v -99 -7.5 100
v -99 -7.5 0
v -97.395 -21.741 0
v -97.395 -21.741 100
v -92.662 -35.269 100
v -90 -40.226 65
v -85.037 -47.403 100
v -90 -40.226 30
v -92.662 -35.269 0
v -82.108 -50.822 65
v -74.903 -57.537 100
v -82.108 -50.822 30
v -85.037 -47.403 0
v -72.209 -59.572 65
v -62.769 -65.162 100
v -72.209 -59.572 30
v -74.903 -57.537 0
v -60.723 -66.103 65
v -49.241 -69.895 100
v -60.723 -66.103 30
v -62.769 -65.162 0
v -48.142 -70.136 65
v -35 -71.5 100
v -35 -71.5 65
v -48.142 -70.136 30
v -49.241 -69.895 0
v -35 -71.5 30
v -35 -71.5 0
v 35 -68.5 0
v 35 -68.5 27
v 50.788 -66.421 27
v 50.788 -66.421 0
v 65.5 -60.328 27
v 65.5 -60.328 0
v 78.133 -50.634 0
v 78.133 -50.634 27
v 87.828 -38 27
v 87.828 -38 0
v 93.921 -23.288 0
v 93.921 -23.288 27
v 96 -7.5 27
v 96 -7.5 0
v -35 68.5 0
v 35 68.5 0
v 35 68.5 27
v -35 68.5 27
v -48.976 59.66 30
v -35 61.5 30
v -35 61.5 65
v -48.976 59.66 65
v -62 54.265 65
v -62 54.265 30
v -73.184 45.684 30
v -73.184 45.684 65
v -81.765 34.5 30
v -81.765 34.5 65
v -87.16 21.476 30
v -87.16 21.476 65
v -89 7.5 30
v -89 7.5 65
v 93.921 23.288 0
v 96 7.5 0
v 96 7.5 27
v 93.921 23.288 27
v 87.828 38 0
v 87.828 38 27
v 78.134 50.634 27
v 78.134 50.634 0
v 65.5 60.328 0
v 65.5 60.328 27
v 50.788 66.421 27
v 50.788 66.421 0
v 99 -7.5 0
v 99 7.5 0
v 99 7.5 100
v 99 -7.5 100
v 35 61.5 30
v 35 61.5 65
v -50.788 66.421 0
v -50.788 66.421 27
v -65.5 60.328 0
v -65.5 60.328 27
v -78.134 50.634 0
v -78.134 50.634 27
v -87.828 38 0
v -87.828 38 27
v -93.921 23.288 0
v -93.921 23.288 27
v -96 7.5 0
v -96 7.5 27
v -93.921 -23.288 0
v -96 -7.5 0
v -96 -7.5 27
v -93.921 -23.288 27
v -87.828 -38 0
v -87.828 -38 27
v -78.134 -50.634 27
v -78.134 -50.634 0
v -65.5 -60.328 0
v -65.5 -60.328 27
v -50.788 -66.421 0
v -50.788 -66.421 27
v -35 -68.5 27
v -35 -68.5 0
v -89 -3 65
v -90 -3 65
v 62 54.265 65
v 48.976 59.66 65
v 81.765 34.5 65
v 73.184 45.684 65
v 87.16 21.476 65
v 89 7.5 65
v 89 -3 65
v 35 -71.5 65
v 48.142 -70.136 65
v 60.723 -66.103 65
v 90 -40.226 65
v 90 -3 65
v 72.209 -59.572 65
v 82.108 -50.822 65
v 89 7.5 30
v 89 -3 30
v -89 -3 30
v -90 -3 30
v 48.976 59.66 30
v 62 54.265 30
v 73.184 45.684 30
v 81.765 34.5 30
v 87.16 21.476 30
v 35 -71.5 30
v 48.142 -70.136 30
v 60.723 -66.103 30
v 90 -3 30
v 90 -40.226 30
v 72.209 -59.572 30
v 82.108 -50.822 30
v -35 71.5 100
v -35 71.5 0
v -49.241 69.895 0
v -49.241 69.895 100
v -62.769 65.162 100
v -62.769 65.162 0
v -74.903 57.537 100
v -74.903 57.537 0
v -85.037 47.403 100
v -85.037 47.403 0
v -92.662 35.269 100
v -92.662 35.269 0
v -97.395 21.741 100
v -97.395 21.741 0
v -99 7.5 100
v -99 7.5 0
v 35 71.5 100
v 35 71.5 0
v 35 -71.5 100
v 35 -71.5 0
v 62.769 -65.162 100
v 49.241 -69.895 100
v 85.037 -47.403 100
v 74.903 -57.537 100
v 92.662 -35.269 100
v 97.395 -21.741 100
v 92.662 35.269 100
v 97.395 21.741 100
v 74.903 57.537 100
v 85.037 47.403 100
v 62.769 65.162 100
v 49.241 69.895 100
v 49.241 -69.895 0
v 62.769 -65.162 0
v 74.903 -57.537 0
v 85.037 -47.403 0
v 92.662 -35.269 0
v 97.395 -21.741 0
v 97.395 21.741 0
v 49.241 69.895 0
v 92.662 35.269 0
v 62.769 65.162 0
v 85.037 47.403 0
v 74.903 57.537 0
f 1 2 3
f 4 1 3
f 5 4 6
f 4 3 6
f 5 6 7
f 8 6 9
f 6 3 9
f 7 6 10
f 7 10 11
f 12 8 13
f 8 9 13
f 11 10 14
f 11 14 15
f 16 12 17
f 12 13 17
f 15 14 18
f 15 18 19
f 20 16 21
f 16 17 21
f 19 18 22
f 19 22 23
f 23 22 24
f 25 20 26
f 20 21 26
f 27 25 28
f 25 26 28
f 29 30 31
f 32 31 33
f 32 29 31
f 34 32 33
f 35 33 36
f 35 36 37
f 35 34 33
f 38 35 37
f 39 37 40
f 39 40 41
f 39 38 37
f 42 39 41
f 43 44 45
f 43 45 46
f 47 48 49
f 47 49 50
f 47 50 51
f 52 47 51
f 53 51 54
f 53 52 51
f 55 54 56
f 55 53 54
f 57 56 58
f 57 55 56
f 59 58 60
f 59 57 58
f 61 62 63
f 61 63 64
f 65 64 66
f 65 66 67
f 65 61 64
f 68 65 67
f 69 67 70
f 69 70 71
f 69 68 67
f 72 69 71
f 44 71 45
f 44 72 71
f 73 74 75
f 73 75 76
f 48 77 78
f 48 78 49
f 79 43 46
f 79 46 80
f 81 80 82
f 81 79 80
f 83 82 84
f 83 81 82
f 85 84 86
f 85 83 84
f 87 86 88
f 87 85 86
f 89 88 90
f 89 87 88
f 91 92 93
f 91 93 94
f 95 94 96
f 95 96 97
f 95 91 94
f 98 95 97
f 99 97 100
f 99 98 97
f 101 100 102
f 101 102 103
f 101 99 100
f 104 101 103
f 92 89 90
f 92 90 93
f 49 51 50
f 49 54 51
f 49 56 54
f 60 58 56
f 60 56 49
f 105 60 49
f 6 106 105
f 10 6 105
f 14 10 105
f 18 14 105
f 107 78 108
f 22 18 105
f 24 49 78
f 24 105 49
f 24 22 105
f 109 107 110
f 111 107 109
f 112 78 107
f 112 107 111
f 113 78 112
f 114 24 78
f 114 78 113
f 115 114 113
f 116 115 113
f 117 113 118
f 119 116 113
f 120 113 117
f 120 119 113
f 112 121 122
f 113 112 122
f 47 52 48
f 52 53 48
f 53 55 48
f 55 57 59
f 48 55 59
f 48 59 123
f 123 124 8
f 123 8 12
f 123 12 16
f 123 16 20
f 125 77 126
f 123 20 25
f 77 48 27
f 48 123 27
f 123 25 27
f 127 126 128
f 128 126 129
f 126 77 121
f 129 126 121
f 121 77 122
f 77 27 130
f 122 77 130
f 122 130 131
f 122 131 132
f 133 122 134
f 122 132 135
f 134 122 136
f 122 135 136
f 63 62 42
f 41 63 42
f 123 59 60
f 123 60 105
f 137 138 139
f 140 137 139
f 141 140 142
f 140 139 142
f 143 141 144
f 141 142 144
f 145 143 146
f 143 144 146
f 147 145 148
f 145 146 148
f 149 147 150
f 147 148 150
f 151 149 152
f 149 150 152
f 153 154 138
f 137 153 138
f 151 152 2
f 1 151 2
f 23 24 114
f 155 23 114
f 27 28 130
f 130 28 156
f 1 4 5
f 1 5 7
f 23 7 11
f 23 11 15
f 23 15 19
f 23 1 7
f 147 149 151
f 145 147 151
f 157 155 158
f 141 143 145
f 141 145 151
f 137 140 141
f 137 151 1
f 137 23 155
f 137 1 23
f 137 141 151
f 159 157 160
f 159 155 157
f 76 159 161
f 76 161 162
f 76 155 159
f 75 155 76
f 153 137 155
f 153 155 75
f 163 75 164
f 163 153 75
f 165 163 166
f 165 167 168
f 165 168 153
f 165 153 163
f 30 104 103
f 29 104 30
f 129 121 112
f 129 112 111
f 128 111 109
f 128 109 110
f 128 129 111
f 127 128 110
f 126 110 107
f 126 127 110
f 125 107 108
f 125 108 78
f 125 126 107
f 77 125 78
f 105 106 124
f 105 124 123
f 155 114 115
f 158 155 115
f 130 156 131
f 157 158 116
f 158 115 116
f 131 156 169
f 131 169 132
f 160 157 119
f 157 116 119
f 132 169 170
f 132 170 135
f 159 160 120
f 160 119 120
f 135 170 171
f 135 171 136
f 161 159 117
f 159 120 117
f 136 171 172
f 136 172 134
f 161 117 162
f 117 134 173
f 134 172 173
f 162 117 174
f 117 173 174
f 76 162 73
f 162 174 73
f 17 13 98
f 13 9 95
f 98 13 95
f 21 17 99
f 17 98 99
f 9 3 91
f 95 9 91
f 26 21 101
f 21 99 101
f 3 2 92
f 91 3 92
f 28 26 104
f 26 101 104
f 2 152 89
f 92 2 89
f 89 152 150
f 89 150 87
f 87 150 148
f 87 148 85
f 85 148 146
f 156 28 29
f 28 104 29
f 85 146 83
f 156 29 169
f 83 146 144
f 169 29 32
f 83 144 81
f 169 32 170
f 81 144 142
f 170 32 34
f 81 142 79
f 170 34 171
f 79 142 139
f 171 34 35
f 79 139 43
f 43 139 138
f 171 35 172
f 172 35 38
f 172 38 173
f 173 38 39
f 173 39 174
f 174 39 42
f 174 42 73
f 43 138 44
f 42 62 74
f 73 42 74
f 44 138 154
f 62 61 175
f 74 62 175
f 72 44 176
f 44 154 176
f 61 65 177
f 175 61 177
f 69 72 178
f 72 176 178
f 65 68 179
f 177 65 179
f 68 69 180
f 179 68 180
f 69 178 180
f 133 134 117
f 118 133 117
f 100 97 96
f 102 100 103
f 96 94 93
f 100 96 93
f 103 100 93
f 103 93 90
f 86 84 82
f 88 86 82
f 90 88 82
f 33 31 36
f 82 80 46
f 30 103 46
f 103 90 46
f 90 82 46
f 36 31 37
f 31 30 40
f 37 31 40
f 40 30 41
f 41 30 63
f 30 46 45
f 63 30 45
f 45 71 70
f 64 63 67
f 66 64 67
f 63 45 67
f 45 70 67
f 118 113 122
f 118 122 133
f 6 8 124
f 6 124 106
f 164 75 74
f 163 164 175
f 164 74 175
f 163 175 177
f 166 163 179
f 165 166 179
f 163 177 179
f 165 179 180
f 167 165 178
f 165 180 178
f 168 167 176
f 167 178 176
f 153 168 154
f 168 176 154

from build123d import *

# Parameters (mm, degrees)
PAD_DEPTH       = 100
POCKET_DEPTH    = 35
SKETCH002_W     = 180
SKETCH002_H     = 35
POCKET001_DEPTH = 77
POCKET002_DEPTH = 27


with BuildPart() as part:
    # Sketch001 → Pad (new body)
    with BuildSketch(Plane.XY):
        with BuildLine():
            ThreePointArc((99, 7.5), (80.254858, 52.75481), (35.000067, 71.5))
            Line((35.000067, 71.5), (-35, 71.5))
            ThreePointArc((-35, 71.5), (-80.254834, 52.754834), (-99, 7.5))
            Line((-99, 7.5), (-99, -7.5))
            ThreePointArc((-99, -7.5), (-80.254834, -52.754834), (-35, -71.5))
            Line((-35, -71.5), (35.000001, -71.5))
            ThreePointArc((35.000001, -71.5), (80.254834, -52.754834), (99, -7.5))
            Line((99, 7.5), (99, -7.5))
        make_face()
    extrude(amount=PAD_DEPTH)

    # Sketch → Pocket (cut)
    with BuildSketch(Plane.XY.offset(30)):
        with BuildLine():
            ThreePointArc((89, 7.5), (73.183766, 45.683767), (34.999999, 61.5))
            Line((34.999999, 61.5), (-35, 61.5))
            ThreePointArc((-35, 61.5), (-73.183766, 45.683766), (-89, 7.5))
            Line((-89, 7.5), (-89, -7.5))
            ThreePointArc((-89, -7.5), (-73.183766, -45.683766), (-35, -61.5))
            Line((-35, -61.5), (35, -61.5))
            ThreePointArc((35, -61.5), (73.183766, -45.683766), (89, -7.5))
            Line((89, 7.5), (89, -7.5))
        make_face()
    extrude(amount=POCKET_DEPTH, mode=Mode.SUBTRACT)

    # Sketch002 → Pocket001 (cut)
    with BuildSketch(Plane.XZ.offset(80)):
        with Locations((0, 47.5)):
            Rectangle(SKETCH002_W, SKETCH002_H)
    extrude(amount=-POCKET001_DEPTH, mode=Mode.SUBTRACT)

    # Sketch003 → Pocket002 (cut)
    with BuildSketch(Plane.XY):
        with BuildLine():
            ThreePointArc((96, 7.5), (78.133514, 50.633513), (35.000001, 68.5))
            Line((35.000001, 68.5), (-35, 68.5))
            ThreePointArc((-35, 68.5), (-78.133514, 50.633514), (-96, 7.5))
            Line((-96, 7.5), (-96, -7.5))
            ThreePointArc((-96, -7.5), (-78.133514, -50.633514), (-35, -68.5))
            Line((-35, -68.5), (34.999897, -68.5))
            ThreePointArc((34.999897, -68.5), (78.133477, -50.63355), (96, -7.5))
            Line((96, 7.5), (96, -7.5))
        make_face()
    extrude(amount=POCKET002_DEPTH, mode=Mode.SUBTRACT)


solid = part.part
